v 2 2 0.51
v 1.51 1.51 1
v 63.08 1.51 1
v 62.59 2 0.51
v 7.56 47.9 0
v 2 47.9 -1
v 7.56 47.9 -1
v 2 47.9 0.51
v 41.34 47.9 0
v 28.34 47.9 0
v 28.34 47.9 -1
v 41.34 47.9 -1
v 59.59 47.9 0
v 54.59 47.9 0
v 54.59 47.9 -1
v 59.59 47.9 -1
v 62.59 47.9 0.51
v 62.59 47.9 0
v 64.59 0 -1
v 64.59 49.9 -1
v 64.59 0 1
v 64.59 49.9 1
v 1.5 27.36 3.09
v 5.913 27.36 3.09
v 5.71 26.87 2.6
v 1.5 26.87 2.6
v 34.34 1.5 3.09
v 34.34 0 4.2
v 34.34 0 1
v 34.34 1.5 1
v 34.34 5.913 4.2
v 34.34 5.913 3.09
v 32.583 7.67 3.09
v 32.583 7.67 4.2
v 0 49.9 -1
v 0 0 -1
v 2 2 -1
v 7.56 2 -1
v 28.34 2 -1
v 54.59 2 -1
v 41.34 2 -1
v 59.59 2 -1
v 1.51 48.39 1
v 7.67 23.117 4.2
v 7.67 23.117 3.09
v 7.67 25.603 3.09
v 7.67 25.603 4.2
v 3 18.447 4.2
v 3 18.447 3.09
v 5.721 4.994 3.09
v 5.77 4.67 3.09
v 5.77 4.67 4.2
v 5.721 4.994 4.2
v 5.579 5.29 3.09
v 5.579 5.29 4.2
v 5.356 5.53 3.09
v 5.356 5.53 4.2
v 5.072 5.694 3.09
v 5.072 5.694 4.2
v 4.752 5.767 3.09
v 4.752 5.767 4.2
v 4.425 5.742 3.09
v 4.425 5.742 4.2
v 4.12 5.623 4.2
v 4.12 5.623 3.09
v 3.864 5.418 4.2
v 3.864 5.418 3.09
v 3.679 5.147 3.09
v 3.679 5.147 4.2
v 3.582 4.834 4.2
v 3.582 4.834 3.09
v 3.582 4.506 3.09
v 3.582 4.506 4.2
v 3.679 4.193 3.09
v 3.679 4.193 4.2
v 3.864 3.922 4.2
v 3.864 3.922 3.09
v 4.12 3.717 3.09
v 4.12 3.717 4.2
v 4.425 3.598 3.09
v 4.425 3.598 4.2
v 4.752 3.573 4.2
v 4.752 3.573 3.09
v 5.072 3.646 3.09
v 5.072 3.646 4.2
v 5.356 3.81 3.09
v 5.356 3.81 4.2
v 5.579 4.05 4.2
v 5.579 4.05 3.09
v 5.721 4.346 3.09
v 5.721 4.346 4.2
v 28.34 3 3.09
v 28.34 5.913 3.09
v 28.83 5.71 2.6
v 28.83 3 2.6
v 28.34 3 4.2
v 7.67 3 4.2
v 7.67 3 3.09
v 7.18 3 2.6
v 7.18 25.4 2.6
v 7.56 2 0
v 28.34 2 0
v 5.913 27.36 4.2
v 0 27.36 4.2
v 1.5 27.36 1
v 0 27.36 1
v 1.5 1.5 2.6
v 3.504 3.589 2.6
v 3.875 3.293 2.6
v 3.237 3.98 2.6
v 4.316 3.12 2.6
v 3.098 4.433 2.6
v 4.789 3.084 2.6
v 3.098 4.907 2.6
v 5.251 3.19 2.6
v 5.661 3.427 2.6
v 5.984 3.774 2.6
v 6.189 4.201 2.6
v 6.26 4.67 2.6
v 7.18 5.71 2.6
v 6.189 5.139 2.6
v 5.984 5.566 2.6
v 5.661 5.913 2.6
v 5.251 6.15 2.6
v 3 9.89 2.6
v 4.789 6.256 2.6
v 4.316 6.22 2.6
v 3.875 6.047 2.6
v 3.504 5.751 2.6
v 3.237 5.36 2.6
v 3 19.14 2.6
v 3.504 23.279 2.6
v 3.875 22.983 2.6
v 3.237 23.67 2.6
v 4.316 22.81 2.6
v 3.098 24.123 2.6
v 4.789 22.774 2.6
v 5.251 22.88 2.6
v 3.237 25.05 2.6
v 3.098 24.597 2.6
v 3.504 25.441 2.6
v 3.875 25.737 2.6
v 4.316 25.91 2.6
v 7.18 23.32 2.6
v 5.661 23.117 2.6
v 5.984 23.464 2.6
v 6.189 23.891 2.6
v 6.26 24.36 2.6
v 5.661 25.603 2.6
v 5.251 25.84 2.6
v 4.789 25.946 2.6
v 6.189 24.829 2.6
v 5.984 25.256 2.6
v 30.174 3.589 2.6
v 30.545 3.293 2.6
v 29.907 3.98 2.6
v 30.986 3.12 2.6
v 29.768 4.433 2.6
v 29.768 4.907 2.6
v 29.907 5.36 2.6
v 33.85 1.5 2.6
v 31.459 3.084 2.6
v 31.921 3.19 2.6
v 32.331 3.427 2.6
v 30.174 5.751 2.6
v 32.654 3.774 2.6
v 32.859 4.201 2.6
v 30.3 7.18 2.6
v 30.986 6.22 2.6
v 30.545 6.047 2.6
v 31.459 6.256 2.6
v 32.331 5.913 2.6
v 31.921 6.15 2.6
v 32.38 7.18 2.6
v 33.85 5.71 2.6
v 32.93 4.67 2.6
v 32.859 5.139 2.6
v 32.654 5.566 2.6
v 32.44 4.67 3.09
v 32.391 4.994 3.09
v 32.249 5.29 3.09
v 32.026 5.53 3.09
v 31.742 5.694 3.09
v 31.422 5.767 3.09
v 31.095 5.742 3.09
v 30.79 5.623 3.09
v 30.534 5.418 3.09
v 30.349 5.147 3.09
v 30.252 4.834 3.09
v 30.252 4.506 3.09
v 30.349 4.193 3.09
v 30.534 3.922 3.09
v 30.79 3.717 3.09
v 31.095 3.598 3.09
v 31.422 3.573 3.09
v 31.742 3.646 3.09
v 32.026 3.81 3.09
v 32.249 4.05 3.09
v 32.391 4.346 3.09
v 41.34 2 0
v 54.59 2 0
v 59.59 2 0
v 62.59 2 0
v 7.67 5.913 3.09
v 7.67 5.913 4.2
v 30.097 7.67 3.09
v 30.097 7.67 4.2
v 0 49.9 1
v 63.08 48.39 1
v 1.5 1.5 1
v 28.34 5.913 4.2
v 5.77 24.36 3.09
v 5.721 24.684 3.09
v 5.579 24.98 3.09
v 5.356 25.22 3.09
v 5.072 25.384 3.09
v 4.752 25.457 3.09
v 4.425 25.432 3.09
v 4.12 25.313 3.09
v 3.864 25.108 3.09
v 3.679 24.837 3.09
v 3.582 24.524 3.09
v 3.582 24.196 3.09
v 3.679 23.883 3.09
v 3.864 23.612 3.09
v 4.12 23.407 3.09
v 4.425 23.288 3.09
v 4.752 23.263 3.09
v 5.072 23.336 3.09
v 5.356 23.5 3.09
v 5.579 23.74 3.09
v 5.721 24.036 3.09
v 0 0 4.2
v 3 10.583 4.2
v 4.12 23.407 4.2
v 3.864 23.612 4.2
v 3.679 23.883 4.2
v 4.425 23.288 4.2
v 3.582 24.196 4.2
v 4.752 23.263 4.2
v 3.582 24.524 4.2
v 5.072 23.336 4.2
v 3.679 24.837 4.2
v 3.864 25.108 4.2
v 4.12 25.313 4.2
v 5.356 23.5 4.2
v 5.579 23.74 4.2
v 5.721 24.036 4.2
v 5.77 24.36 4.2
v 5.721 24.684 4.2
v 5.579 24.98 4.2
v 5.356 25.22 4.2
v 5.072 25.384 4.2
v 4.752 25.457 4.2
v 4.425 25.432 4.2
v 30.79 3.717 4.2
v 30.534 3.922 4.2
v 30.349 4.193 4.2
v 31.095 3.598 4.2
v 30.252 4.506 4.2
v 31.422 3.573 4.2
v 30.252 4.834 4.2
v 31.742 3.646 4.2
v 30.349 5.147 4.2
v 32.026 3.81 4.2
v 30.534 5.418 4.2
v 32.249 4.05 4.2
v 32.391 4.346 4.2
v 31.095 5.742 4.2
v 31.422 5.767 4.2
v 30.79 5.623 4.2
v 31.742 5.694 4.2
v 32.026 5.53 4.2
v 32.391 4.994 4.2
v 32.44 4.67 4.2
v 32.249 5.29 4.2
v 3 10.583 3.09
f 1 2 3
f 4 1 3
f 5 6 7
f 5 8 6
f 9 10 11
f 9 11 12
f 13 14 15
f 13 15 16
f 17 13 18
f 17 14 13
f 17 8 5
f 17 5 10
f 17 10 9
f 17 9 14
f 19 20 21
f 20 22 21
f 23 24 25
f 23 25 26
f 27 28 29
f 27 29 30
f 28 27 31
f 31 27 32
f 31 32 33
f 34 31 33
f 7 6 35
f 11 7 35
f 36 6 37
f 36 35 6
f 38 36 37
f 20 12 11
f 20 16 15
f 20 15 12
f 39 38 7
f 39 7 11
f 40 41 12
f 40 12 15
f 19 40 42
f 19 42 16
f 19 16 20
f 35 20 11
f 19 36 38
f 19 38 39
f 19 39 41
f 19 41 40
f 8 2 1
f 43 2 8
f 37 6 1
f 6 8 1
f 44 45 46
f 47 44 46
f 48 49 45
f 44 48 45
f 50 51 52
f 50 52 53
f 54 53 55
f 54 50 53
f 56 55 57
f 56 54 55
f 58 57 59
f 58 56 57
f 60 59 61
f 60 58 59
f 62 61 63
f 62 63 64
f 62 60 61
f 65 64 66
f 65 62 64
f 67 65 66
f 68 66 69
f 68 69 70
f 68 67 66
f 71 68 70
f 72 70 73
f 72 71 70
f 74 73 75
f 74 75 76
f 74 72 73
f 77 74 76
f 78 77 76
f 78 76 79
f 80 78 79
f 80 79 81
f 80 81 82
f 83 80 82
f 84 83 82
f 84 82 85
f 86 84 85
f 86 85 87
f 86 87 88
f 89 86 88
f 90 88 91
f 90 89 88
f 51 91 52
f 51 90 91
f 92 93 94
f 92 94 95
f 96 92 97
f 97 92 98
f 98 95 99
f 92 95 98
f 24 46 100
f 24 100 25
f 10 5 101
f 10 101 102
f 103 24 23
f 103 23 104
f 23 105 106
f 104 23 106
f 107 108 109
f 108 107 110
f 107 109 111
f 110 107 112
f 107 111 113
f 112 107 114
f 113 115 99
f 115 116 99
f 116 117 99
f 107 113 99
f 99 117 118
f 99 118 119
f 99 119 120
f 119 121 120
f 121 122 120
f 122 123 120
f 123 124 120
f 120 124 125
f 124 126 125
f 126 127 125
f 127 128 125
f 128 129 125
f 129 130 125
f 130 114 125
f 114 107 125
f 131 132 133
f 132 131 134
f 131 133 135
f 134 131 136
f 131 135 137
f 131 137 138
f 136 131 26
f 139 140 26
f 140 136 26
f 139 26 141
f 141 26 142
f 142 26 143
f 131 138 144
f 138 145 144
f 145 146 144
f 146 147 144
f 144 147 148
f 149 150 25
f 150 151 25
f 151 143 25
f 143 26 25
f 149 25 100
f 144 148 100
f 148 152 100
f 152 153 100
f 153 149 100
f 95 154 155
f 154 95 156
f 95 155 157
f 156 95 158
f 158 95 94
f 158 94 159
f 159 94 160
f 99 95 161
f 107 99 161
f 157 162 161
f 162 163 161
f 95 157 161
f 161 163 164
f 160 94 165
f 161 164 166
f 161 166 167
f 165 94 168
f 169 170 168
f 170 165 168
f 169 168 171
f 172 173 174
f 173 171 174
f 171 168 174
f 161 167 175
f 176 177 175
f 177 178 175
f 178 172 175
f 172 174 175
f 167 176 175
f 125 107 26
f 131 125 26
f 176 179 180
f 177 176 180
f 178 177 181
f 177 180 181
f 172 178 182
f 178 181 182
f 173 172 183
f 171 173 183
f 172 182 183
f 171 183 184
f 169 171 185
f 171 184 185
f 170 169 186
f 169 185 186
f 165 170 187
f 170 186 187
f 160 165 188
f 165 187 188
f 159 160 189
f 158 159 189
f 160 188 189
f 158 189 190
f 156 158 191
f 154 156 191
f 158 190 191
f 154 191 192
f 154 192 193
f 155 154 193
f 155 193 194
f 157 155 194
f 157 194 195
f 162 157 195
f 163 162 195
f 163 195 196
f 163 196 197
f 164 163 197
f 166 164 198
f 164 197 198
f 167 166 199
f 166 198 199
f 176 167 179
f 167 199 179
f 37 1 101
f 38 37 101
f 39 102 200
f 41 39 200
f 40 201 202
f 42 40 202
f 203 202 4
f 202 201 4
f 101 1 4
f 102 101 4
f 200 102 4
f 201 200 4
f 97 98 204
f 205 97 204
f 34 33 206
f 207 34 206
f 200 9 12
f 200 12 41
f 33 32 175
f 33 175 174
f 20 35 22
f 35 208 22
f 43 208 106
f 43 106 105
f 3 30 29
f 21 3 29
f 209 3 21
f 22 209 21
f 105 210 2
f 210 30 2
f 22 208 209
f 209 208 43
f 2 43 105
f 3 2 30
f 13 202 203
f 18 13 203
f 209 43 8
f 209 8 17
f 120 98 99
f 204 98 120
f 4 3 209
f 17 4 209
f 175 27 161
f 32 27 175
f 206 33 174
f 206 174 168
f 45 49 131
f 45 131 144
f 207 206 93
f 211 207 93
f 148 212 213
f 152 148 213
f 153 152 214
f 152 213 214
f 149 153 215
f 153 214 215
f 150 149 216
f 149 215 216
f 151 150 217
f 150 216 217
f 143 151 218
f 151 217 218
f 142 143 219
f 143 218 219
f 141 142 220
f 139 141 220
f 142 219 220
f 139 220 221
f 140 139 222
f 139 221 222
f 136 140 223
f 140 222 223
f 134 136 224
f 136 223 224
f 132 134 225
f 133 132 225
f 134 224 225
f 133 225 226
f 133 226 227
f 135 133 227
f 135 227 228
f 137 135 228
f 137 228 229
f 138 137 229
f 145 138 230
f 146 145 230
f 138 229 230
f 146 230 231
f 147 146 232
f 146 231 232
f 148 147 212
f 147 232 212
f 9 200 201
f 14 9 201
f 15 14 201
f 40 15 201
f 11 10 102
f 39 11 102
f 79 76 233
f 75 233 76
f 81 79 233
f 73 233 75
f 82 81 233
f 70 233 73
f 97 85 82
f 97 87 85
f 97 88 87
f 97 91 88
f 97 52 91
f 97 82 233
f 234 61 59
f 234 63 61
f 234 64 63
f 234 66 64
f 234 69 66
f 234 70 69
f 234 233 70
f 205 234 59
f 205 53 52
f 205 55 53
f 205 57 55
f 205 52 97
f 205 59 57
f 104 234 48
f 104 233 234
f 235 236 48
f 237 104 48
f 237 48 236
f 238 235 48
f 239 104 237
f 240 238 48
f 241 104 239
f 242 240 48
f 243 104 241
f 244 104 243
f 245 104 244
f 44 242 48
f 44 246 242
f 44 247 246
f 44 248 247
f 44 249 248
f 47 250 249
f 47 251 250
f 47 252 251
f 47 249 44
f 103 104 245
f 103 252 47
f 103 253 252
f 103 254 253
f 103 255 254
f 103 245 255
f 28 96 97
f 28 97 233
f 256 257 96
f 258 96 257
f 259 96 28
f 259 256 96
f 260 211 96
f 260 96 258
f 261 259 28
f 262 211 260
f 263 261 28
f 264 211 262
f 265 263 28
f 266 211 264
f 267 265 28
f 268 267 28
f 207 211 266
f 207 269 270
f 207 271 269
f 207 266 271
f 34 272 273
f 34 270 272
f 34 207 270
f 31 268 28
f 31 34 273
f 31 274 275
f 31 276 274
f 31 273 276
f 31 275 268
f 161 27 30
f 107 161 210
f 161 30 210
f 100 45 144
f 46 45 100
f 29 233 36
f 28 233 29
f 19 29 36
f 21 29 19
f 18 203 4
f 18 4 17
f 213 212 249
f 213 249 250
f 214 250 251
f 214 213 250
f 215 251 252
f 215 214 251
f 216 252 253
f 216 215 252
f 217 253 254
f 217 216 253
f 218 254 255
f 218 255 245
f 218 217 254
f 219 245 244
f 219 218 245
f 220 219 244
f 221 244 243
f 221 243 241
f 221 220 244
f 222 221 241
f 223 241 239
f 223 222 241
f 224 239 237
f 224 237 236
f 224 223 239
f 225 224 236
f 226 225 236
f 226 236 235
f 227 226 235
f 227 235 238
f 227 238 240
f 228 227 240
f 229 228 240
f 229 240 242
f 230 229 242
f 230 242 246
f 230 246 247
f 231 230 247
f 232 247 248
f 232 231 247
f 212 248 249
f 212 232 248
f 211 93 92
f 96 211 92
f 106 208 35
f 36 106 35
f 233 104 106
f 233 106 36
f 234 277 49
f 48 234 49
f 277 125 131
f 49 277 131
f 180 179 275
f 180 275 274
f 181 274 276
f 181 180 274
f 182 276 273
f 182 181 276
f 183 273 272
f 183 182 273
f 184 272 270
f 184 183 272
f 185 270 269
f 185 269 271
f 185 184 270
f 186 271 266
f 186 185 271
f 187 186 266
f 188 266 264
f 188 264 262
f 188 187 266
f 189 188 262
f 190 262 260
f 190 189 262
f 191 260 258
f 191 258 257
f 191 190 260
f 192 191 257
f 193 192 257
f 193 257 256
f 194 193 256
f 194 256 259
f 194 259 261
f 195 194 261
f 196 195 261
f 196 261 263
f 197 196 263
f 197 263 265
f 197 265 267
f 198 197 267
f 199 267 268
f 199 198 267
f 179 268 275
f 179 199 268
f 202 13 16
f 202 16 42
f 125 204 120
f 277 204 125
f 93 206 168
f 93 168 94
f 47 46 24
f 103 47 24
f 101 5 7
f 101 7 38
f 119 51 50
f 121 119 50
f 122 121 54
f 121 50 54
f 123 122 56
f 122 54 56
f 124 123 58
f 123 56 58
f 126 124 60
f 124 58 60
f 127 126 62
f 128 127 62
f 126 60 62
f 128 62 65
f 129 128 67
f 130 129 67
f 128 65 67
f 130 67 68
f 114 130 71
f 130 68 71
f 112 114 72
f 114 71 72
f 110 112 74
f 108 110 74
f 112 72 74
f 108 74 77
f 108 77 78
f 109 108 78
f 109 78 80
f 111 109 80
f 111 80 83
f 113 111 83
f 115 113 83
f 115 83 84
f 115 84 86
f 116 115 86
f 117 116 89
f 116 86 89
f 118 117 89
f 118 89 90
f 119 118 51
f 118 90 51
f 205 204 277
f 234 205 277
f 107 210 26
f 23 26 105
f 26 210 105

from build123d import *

# Parameters (mm, degrees)
SKETCH002_W     = 64.59
SKETCH002_H     = 49.9
SKETCH002_W_2   = 60.59
SKETCH002_H_2   = 45.9
PAD_DEPTH       = 1
PAD001_DEPTH    = 1.6
SKETCH005_R     = 1.1
PAD002_DEPTH    = 1.6
CHAMFER_SIZE    = 0.49
SKETCH_W        = 64.59
SKETCH_H        = 49.9
SKETCH_W_2      = 13
SKETCH_H_2      = 45.9
SKETCH_W_3      = 5
SKETCH_W_4      = 5.56
PAD003_DEPTH    = 1
CHAMFER001_SIZE = 0.49


with BuildPart() as part:
    # Sketch002 → Pad (new body)
    with BuildSketch(Plane.XY):
        with Locations((32.295, 24.95)):
            Rectangle(SKETCH002_W, SKETCH002_H)
        with Locations((32.295, 24.95)):
            Rectangle(SKETCH002_W_2, SKETCH002_H_2, mode=Mode.SUBTRACT)
    extrude(amount=PAD_DEPTH)

    # Sketch006 (on Face10 of Pad) → Pad001 (join)
    with BuildSketch(Plane.XY.offset(1)):
        Polygon((0, 27.36), (0, 0), (34.34, 0), (34.34, 1.5), (1.5, 1.5), (1.5, 27.36), align=None)
    extrude(amount=PAD001_DEPTH)

    # Sketch005 (on Face17 of Pad001) → Pad002 (join)
    with BuildSketch(Plane.XY.offset(2.6)):
        Polygon((0, 0), (34.34, 0), (34.34, 5.912641), (32.582641, 7.67), (30.097359, 7.67), (28.34, 5.912641), (28.34, 3), (7.67, 3), (7.67, 5.912641), (3, 10.582641), (3, 18.447359), (7.67, 23.117359), (7.67, 25.602641), (5.912641, 27.36), (0, 27.36), align=None)
        with Locations((31.34, 4.67)):
            Circle(SKETCH005_R, mode=Mode.SUBTRACT)
        with Locations((4.67, 24.36)):
            Circle(SKETCH005_R, mode=Mode.SUBTRACT)
        with Locations((4.67, 4.67)):
            Circle(SKETCH005_R, mode=Mode.SUBTRACT)
    extrude(amount=PAD002_DEPTH)

    # Chamfer
    chamfer_edges = [part.edges().sort_by_distance(p)[0] for p in [
        (2, 24.95, 1),
        (32.295, 2, 1),
        (62.59, 24.95, 1),
        (32.295, 47.9, 1),
    ]]
    chamfer(chamfer_edges, length=CHAMFER_SIZE)

    # Sketch (on Face18 of Chamfer) → Pad003 (join)
    with BuildSketch(Plane(origin=(0, 0, 0), x_dir=(1, 0, 0), z_dir=(0, 0, -1))):
        with Locations((32.295, -24.95)):
            Rectangle(SKETCH_W, SKETCH_H)
        with Locations((34.84, -24.95)):
            Rectangle(SKETCH_W_2, SKETCH_H_2, mode=Mode.SUBTRACT)
        with Locations((57.09, -24.95)):
            Rectangle(SKETCH_W_3, SKETCH_H_2, mode=Mode.SUBTRACT)
        with Locations((4.78, -24.95)):
            Rectangle(SKETCH_W_4, SKETCH_H_2, mode=Mode.SUBTRACT)
    extrude(amount=PAD003_DEPTH)

    # Chamfer001
    chamfer001_edges = [part.edges().sort_by_distance(p)[0] for p in [
        (34.34, 3.70632, 2.6),
        (33.46132, 6.79132, 2.6),
        (30.24, 4.67, 2.6),
        (31.34, 7.67, 2.6),
        (29.21868, 6.79132, 2.6),
        (28.34, 4.45632, 2.6),
        (7.67, 4.45632, 2.6),
        (5.335, 8.247641, 2.6),
        (3.70632, 27.36, 2.6),
        (6.79132, 26.48132, 2.6),
        (7.67, 24.36, 2.6),
        (5.335, 20.782359, 2.6),
        (3.57, 4.67, 2.6),
        (3.57, 24.36, 2.6),
    ]]
    chamfer(chamfer001_edges, length=CHAMFER001_SIZE)


solid = part.part
